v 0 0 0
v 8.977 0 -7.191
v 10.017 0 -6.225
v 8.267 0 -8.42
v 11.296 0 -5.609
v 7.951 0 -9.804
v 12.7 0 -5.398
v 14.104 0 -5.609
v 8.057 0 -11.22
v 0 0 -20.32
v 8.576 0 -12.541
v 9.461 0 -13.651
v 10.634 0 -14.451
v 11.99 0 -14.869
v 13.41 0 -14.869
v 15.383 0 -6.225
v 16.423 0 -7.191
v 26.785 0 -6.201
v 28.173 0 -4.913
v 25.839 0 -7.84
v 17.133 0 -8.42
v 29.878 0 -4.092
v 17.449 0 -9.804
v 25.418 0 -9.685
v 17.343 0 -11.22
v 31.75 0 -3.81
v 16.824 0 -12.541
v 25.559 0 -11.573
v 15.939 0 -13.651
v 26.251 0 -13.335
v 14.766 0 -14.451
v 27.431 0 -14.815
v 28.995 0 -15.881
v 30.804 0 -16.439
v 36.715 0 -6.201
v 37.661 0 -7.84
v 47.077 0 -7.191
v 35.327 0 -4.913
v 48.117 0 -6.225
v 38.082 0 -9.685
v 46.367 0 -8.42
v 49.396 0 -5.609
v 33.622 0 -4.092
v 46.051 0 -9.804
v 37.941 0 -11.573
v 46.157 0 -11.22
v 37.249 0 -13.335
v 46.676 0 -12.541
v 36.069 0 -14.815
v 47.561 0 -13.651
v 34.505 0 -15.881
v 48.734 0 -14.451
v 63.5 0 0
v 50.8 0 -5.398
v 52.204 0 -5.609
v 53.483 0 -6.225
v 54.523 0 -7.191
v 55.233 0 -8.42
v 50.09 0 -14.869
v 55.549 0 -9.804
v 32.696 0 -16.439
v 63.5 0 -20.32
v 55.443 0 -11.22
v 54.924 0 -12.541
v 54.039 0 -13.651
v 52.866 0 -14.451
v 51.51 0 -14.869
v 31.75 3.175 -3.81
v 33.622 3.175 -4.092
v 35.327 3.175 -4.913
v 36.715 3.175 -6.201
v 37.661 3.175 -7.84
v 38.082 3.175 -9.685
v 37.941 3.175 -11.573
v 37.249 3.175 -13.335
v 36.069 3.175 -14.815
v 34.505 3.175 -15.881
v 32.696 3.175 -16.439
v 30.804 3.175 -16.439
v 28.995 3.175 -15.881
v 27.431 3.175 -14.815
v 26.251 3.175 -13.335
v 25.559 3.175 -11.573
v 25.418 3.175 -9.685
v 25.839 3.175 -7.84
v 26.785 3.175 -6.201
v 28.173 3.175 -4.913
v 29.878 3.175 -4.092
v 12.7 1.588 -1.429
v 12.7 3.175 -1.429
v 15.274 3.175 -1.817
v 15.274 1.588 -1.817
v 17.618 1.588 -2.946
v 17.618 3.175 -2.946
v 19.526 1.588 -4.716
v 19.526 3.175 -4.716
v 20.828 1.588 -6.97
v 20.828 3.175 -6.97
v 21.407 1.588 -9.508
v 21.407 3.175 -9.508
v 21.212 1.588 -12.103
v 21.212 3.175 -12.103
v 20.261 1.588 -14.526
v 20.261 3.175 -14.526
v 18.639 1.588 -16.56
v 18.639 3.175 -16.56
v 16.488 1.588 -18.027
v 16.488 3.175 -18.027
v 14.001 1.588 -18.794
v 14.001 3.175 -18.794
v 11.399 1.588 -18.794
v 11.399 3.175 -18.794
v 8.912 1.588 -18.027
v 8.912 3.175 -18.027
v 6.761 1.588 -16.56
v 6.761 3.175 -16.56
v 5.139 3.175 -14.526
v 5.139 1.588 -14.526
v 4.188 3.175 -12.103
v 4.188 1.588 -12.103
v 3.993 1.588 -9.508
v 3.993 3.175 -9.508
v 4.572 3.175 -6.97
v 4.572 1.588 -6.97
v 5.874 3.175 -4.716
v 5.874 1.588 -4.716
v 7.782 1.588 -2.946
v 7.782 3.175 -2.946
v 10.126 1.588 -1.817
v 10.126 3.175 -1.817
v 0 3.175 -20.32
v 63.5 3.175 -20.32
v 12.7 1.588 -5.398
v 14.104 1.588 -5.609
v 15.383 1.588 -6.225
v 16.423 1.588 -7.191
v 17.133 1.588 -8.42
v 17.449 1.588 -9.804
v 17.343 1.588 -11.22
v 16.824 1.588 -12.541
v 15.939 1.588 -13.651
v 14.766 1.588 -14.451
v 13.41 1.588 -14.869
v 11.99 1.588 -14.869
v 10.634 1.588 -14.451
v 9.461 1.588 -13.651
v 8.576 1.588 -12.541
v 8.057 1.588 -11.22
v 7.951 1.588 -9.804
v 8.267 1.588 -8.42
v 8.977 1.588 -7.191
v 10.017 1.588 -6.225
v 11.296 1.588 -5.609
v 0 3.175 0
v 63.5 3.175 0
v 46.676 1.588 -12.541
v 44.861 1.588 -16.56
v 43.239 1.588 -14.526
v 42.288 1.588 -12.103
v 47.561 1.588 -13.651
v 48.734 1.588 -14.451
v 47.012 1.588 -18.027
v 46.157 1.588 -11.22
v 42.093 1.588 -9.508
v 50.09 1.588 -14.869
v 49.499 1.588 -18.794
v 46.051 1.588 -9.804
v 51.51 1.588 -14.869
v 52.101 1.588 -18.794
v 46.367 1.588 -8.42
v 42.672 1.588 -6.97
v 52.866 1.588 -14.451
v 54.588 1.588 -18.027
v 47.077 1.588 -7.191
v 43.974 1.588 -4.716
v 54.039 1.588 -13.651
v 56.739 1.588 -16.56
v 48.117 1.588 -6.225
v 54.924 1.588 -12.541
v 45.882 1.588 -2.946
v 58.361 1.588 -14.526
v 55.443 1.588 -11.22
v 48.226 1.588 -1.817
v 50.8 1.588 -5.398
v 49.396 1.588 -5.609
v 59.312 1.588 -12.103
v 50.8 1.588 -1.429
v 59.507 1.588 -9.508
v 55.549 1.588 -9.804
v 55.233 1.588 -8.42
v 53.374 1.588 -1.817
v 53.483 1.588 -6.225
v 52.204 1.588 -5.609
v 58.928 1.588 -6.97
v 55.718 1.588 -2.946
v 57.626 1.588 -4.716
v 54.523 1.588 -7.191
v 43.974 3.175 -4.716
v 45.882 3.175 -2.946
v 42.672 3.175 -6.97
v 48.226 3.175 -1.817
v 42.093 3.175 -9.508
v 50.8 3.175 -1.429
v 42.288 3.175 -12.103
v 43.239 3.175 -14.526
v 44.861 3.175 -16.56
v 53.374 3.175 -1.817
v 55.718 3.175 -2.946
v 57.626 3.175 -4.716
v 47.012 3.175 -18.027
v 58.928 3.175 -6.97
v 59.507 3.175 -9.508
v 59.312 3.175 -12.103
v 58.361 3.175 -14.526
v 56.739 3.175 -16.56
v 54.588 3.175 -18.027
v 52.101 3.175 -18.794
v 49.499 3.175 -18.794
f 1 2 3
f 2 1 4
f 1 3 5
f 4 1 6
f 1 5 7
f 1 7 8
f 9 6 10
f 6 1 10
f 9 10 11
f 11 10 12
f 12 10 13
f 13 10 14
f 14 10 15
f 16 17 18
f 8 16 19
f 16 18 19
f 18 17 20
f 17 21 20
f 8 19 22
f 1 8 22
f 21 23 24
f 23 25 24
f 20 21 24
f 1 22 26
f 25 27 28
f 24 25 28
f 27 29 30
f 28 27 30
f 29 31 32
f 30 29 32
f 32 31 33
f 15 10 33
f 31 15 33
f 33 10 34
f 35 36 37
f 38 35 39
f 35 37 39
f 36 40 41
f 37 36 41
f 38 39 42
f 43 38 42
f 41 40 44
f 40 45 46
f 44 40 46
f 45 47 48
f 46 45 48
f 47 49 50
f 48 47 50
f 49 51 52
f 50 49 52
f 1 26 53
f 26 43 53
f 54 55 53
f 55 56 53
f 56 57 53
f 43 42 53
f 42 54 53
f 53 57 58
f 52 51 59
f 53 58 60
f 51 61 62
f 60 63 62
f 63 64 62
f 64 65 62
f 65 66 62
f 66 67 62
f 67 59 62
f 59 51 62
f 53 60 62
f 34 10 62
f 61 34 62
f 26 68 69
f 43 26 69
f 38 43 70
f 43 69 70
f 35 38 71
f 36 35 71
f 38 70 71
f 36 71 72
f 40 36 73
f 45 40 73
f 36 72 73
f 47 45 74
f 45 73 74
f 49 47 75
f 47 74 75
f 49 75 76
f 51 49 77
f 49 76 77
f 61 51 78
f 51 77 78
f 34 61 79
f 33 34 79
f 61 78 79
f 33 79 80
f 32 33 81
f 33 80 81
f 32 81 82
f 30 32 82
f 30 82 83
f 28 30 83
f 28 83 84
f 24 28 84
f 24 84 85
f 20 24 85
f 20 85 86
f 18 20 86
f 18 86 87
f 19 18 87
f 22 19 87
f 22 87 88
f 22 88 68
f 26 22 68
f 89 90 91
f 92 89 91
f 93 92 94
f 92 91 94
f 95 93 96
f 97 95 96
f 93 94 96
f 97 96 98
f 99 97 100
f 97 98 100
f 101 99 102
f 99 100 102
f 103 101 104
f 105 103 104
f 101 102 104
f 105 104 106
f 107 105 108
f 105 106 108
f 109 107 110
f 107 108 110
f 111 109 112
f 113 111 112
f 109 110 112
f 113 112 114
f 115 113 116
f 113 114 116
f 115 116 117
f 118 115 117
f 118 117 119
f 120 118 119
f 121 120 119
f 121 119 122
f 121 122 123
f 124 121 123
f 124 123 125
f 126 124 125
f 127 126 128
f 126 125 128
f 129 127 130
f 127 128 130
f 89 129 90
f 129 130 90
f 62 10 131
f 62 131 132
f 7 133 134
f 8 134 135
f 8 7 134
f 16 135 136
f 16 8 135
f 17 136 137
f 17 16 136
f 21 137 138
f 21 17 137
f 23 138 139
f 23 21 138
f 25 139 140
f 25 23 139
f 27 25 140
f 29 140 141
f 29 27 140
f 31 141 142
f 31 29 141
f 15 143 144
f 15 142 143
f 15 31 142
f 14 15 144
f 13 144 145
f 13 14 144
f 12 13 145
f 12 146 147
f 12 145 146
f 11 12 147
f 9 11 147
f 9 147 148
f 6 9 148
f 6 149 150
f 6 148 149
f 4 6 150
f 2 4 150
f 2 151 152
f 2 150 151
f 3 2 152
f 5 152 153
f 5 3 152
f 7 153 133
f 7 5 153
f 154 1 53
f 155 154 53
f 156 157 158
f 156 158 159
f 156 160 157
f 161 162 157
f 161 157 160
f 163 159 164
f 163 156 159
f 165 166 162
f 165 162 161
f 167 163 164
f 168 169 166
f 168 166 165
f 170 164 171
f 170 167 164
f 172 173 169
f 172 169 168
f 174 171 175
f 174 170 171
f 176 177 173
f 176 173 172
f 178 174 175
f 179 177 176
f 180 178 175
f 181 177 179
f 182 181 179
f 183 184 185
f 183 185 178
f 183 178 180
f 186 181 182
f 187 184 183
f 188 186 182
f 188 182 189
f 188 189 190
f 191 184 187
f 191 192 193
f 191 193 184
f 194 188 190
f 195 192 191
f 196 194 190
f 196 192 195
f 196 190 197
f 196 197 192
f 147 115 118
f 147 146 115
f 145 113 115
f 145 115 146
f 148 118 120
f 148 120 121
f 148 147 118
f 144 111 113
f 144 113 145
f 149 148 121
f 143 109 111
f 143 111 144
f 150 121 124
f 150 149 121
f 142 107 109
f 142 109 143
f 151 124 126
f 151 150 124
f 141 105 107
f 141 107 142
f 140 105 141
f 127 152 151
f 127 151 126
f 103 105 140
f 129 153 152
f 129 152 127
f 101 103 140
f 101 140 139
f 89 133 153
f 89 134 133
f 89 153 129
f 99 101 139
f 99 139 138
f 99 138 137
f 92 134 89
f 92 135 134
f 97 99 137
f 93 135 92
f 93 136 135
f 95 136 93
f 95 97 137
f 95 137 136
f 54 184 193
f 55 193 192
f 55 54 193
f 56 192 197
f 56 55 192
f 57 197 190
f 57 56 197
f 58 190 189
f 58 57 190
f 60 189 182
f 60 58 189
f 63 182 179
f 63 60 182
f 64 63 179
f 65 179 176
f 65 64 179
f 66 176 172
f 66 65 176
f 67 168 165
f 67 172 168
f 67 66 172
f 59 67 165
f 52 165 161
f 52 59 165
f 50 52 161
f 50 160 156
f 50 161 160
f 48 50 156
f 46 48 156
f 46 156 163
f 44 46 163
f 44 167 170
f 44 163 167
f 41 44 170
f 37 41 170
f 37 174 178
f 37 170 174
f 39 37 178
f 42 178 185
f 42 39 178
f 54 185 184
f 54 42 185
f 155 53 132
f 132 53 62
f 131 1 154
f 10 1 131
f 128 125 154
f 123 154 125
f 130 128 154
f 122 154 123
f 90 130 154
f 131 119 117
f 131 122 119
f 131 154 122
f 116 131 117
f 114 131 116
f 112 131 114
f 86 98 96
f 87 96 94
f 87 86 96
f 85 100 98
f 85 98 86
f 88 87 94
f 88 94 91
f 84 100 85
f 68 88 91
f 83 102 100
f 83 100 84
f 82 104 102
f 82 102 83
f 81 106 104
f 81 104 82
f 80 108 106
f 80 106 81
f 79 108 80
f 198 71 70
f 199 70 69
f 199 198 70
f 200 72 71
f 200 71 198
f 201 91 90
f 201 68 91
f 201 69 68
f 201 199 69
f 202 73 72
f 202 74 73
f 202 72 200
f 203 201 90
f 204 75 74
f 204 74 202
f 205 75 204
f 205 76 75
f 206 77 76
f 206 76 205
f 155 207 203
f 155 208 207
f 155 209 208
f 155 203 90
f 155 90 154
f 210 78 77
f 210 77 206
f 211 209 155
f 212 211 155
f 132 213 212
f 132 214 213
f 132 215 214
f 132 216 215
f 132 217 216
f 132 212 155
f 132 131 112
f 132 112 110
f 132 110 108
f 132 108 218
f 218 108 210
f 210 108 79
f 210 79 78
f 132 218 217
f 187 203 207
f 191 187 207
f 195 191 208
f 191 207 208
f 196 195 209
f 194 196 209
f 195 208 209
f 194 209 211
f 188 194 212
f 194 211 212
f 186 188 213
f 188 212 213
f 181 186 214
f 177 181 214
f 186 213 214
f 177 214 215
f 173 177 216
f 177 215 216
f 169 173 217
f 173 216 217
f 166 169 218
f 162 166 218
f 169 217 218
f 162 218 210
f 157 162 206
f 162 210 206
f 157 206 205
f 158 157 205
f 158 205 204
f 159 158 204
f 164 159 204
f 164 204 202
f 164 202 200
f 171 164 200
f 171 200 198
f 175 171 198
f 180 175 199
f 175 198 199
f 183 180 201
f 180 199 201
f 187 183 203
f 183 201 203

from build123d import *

# Parameters (mm, degrees)
SKETCH1_W           = 63.5
SKETCH1_H           = 20.32
SKETCH1_R           = 4.7625
BOSS_EXTRUDE1_DEPTH = 3.175
SKETCH2_R           = 6.35
CUT_EXTRUDE1_DEPTH  = 6.35
SKETCH3_R           = 8.73125
CUT_EXTRUDE2_DEPTH  = 1.5875


with BuildPart() as part:
    # Sketch1 → Boss-Extrude1 (new body)
    with BuildSketch(Plane(origin=(0, 0, 0), x_dir=(1, 0, 0), z_dir=(0, 1, 0))):
        with Locations((31.75, 10.16)):
            Rectangle(SKETCH1_W, SKETCH1_H)
        with Locations(Location((12.7, 10.16, 0), (0, 0, 270))):
            Circle(SKETCH1_R, mode=Mode.SUBTRACT)
        with Locations(Location((50.8, 10.16, 0), (0, 0, 270))):
            Circle(SKETCH1_R, mode=Mode.SUBTRACT)
    extrude(amount=BOSS_EXTRUDE1_DEPTH)

    # Sketch2 → Cut-Extrude1 (cut)
    with BuildSketch(Plane(origin=(0, 3.175, 0), x_dir=(1, 0, 0), z_dir=(0, 1, 0))):
        with Locations(Location((31.75, 10.16, 0), (0, 0, 270))):
            Circle(SKETCH2_R)
    extrude(amount=-CUT_EXTRUDE1_DEPTH, mode=Mode.SUBTRACT)

    # Sketch3 → Cut-Extrude2 (cut)
    with BuildSketch(Plane(origin=(0, 3.175, 0), x_dir=(1, 0, 0), z_dir=(0, 1, 0))):
        with Locations(Location((12.7, 10.16, 0), (0, 0, 270))):
            Circle(SKETCH3_R)
        with Locations(Location((50.8, 10.16, 0), (0, 0, 270))):
            Circle(SKETCH3_R)
    extrude(amount=-CUT_EXTRUDE2_DEPTH, mode=Mode.SUBTRACT)


solid = part.part
